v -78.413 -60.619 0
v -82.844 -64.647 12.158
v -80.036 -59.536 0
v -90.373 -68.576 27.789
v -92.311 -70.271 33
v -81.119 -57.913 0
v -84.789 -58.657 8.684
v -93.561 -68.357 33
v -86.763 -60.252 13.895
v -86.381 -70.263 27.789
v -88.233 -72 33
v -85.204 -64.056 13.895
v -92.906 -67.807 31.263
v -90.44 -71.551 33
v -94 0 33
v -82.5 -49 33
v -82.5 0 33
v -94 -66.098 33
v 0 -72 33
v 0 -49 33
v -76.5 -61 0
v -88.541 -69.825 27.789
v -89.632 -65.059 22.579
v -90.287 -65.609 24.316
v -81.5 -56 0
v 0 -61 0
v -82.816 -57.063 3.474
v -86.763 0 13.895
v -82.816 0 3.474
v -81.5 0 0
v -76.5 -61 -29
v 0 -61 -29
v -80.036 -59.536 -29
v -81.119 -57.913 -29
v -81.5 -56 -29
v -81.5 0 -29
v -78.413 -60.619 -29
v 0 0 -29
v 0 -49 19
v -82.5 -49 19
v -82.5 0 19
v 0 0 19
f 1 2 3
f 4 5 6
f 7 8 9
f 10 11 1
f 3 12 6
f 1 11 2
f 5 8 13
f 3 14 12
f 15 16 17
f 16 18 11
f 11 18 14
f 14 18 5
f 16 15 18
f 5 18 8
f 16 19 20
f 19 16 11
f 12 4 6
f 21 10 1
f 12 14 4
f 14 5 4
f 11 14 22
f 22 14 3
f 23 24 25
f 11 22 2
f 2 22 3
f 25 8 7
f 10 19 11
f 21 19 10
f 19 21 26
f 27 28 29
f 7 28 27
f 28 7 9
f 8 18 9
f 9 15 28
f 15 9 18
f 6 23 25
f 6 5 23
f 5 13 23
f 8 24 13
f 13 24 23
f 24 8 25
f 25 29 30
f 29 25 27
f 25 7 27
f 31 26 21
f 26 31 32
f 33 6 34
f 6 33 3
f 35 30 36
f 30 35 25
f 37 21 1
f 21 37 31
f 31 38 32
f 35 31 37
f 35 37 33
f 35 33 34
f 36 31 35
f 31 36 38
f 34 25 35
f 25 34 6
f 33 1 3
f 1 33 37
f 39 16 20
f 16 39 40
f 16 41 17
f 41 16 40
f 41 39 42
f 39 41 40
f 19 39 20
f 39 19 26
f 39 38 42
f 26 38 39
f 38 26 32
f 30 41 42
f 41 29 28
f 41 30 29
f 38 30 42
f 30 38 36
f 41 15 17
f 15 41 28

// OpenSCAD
/*------------------------------variables--------------------------------------------*/
inLength = 163;
inWidth = 122;


outLength = 188;
outWidth = 144;

screenLength = 165;
screenWidth = 98;
screenThickness = 15;

sideDistance = 34;
upDownDistance = 20;

inOutDistance = 33;

backThickness = 30;
bevelRadius = 5;
/*--------------------------------main--------------------------------------------*/
//screen();
rotate([-90,0,0])
difference()
{
    whole();
    translate([100,0,0])cube(200,center = true);
    translate([0,0,100])cube(200,center = true);
}

/*-------------------------------modules----------------------------------------------*/

module whole()
{
    difference()
    {
        union()
        {
            front();
            back();
        }
        screen();
    }
}

module back(){
    translate([0,backThickness-1,0]) 
    rotate([90,0,0])
        linear_extrude(height = backThickness)
                minkowski()
                {
                  square([inLength-2*bevelRadius, inWidth-2*bevelRadius], center = true);
                  circle(r=bevelRadius);
                }
}
module front()
{
    rotate([90,0,0])
    linear_extrude(height = inOutDistance, scale = [outLength/inLength,outWidth/inWidth])
        minkowski()
        {
          square([inLength-2*bevelRadius, inWidth-2*bevelRadius], center = true);
          circle(r=bevelRadius);
        }
}
module screen()
{
    translate([0,-(inOutDistance-screenThickness/2+1),0]) 
    cube([screenLength,screenThickness,screenWidth],center = true);
}

        
